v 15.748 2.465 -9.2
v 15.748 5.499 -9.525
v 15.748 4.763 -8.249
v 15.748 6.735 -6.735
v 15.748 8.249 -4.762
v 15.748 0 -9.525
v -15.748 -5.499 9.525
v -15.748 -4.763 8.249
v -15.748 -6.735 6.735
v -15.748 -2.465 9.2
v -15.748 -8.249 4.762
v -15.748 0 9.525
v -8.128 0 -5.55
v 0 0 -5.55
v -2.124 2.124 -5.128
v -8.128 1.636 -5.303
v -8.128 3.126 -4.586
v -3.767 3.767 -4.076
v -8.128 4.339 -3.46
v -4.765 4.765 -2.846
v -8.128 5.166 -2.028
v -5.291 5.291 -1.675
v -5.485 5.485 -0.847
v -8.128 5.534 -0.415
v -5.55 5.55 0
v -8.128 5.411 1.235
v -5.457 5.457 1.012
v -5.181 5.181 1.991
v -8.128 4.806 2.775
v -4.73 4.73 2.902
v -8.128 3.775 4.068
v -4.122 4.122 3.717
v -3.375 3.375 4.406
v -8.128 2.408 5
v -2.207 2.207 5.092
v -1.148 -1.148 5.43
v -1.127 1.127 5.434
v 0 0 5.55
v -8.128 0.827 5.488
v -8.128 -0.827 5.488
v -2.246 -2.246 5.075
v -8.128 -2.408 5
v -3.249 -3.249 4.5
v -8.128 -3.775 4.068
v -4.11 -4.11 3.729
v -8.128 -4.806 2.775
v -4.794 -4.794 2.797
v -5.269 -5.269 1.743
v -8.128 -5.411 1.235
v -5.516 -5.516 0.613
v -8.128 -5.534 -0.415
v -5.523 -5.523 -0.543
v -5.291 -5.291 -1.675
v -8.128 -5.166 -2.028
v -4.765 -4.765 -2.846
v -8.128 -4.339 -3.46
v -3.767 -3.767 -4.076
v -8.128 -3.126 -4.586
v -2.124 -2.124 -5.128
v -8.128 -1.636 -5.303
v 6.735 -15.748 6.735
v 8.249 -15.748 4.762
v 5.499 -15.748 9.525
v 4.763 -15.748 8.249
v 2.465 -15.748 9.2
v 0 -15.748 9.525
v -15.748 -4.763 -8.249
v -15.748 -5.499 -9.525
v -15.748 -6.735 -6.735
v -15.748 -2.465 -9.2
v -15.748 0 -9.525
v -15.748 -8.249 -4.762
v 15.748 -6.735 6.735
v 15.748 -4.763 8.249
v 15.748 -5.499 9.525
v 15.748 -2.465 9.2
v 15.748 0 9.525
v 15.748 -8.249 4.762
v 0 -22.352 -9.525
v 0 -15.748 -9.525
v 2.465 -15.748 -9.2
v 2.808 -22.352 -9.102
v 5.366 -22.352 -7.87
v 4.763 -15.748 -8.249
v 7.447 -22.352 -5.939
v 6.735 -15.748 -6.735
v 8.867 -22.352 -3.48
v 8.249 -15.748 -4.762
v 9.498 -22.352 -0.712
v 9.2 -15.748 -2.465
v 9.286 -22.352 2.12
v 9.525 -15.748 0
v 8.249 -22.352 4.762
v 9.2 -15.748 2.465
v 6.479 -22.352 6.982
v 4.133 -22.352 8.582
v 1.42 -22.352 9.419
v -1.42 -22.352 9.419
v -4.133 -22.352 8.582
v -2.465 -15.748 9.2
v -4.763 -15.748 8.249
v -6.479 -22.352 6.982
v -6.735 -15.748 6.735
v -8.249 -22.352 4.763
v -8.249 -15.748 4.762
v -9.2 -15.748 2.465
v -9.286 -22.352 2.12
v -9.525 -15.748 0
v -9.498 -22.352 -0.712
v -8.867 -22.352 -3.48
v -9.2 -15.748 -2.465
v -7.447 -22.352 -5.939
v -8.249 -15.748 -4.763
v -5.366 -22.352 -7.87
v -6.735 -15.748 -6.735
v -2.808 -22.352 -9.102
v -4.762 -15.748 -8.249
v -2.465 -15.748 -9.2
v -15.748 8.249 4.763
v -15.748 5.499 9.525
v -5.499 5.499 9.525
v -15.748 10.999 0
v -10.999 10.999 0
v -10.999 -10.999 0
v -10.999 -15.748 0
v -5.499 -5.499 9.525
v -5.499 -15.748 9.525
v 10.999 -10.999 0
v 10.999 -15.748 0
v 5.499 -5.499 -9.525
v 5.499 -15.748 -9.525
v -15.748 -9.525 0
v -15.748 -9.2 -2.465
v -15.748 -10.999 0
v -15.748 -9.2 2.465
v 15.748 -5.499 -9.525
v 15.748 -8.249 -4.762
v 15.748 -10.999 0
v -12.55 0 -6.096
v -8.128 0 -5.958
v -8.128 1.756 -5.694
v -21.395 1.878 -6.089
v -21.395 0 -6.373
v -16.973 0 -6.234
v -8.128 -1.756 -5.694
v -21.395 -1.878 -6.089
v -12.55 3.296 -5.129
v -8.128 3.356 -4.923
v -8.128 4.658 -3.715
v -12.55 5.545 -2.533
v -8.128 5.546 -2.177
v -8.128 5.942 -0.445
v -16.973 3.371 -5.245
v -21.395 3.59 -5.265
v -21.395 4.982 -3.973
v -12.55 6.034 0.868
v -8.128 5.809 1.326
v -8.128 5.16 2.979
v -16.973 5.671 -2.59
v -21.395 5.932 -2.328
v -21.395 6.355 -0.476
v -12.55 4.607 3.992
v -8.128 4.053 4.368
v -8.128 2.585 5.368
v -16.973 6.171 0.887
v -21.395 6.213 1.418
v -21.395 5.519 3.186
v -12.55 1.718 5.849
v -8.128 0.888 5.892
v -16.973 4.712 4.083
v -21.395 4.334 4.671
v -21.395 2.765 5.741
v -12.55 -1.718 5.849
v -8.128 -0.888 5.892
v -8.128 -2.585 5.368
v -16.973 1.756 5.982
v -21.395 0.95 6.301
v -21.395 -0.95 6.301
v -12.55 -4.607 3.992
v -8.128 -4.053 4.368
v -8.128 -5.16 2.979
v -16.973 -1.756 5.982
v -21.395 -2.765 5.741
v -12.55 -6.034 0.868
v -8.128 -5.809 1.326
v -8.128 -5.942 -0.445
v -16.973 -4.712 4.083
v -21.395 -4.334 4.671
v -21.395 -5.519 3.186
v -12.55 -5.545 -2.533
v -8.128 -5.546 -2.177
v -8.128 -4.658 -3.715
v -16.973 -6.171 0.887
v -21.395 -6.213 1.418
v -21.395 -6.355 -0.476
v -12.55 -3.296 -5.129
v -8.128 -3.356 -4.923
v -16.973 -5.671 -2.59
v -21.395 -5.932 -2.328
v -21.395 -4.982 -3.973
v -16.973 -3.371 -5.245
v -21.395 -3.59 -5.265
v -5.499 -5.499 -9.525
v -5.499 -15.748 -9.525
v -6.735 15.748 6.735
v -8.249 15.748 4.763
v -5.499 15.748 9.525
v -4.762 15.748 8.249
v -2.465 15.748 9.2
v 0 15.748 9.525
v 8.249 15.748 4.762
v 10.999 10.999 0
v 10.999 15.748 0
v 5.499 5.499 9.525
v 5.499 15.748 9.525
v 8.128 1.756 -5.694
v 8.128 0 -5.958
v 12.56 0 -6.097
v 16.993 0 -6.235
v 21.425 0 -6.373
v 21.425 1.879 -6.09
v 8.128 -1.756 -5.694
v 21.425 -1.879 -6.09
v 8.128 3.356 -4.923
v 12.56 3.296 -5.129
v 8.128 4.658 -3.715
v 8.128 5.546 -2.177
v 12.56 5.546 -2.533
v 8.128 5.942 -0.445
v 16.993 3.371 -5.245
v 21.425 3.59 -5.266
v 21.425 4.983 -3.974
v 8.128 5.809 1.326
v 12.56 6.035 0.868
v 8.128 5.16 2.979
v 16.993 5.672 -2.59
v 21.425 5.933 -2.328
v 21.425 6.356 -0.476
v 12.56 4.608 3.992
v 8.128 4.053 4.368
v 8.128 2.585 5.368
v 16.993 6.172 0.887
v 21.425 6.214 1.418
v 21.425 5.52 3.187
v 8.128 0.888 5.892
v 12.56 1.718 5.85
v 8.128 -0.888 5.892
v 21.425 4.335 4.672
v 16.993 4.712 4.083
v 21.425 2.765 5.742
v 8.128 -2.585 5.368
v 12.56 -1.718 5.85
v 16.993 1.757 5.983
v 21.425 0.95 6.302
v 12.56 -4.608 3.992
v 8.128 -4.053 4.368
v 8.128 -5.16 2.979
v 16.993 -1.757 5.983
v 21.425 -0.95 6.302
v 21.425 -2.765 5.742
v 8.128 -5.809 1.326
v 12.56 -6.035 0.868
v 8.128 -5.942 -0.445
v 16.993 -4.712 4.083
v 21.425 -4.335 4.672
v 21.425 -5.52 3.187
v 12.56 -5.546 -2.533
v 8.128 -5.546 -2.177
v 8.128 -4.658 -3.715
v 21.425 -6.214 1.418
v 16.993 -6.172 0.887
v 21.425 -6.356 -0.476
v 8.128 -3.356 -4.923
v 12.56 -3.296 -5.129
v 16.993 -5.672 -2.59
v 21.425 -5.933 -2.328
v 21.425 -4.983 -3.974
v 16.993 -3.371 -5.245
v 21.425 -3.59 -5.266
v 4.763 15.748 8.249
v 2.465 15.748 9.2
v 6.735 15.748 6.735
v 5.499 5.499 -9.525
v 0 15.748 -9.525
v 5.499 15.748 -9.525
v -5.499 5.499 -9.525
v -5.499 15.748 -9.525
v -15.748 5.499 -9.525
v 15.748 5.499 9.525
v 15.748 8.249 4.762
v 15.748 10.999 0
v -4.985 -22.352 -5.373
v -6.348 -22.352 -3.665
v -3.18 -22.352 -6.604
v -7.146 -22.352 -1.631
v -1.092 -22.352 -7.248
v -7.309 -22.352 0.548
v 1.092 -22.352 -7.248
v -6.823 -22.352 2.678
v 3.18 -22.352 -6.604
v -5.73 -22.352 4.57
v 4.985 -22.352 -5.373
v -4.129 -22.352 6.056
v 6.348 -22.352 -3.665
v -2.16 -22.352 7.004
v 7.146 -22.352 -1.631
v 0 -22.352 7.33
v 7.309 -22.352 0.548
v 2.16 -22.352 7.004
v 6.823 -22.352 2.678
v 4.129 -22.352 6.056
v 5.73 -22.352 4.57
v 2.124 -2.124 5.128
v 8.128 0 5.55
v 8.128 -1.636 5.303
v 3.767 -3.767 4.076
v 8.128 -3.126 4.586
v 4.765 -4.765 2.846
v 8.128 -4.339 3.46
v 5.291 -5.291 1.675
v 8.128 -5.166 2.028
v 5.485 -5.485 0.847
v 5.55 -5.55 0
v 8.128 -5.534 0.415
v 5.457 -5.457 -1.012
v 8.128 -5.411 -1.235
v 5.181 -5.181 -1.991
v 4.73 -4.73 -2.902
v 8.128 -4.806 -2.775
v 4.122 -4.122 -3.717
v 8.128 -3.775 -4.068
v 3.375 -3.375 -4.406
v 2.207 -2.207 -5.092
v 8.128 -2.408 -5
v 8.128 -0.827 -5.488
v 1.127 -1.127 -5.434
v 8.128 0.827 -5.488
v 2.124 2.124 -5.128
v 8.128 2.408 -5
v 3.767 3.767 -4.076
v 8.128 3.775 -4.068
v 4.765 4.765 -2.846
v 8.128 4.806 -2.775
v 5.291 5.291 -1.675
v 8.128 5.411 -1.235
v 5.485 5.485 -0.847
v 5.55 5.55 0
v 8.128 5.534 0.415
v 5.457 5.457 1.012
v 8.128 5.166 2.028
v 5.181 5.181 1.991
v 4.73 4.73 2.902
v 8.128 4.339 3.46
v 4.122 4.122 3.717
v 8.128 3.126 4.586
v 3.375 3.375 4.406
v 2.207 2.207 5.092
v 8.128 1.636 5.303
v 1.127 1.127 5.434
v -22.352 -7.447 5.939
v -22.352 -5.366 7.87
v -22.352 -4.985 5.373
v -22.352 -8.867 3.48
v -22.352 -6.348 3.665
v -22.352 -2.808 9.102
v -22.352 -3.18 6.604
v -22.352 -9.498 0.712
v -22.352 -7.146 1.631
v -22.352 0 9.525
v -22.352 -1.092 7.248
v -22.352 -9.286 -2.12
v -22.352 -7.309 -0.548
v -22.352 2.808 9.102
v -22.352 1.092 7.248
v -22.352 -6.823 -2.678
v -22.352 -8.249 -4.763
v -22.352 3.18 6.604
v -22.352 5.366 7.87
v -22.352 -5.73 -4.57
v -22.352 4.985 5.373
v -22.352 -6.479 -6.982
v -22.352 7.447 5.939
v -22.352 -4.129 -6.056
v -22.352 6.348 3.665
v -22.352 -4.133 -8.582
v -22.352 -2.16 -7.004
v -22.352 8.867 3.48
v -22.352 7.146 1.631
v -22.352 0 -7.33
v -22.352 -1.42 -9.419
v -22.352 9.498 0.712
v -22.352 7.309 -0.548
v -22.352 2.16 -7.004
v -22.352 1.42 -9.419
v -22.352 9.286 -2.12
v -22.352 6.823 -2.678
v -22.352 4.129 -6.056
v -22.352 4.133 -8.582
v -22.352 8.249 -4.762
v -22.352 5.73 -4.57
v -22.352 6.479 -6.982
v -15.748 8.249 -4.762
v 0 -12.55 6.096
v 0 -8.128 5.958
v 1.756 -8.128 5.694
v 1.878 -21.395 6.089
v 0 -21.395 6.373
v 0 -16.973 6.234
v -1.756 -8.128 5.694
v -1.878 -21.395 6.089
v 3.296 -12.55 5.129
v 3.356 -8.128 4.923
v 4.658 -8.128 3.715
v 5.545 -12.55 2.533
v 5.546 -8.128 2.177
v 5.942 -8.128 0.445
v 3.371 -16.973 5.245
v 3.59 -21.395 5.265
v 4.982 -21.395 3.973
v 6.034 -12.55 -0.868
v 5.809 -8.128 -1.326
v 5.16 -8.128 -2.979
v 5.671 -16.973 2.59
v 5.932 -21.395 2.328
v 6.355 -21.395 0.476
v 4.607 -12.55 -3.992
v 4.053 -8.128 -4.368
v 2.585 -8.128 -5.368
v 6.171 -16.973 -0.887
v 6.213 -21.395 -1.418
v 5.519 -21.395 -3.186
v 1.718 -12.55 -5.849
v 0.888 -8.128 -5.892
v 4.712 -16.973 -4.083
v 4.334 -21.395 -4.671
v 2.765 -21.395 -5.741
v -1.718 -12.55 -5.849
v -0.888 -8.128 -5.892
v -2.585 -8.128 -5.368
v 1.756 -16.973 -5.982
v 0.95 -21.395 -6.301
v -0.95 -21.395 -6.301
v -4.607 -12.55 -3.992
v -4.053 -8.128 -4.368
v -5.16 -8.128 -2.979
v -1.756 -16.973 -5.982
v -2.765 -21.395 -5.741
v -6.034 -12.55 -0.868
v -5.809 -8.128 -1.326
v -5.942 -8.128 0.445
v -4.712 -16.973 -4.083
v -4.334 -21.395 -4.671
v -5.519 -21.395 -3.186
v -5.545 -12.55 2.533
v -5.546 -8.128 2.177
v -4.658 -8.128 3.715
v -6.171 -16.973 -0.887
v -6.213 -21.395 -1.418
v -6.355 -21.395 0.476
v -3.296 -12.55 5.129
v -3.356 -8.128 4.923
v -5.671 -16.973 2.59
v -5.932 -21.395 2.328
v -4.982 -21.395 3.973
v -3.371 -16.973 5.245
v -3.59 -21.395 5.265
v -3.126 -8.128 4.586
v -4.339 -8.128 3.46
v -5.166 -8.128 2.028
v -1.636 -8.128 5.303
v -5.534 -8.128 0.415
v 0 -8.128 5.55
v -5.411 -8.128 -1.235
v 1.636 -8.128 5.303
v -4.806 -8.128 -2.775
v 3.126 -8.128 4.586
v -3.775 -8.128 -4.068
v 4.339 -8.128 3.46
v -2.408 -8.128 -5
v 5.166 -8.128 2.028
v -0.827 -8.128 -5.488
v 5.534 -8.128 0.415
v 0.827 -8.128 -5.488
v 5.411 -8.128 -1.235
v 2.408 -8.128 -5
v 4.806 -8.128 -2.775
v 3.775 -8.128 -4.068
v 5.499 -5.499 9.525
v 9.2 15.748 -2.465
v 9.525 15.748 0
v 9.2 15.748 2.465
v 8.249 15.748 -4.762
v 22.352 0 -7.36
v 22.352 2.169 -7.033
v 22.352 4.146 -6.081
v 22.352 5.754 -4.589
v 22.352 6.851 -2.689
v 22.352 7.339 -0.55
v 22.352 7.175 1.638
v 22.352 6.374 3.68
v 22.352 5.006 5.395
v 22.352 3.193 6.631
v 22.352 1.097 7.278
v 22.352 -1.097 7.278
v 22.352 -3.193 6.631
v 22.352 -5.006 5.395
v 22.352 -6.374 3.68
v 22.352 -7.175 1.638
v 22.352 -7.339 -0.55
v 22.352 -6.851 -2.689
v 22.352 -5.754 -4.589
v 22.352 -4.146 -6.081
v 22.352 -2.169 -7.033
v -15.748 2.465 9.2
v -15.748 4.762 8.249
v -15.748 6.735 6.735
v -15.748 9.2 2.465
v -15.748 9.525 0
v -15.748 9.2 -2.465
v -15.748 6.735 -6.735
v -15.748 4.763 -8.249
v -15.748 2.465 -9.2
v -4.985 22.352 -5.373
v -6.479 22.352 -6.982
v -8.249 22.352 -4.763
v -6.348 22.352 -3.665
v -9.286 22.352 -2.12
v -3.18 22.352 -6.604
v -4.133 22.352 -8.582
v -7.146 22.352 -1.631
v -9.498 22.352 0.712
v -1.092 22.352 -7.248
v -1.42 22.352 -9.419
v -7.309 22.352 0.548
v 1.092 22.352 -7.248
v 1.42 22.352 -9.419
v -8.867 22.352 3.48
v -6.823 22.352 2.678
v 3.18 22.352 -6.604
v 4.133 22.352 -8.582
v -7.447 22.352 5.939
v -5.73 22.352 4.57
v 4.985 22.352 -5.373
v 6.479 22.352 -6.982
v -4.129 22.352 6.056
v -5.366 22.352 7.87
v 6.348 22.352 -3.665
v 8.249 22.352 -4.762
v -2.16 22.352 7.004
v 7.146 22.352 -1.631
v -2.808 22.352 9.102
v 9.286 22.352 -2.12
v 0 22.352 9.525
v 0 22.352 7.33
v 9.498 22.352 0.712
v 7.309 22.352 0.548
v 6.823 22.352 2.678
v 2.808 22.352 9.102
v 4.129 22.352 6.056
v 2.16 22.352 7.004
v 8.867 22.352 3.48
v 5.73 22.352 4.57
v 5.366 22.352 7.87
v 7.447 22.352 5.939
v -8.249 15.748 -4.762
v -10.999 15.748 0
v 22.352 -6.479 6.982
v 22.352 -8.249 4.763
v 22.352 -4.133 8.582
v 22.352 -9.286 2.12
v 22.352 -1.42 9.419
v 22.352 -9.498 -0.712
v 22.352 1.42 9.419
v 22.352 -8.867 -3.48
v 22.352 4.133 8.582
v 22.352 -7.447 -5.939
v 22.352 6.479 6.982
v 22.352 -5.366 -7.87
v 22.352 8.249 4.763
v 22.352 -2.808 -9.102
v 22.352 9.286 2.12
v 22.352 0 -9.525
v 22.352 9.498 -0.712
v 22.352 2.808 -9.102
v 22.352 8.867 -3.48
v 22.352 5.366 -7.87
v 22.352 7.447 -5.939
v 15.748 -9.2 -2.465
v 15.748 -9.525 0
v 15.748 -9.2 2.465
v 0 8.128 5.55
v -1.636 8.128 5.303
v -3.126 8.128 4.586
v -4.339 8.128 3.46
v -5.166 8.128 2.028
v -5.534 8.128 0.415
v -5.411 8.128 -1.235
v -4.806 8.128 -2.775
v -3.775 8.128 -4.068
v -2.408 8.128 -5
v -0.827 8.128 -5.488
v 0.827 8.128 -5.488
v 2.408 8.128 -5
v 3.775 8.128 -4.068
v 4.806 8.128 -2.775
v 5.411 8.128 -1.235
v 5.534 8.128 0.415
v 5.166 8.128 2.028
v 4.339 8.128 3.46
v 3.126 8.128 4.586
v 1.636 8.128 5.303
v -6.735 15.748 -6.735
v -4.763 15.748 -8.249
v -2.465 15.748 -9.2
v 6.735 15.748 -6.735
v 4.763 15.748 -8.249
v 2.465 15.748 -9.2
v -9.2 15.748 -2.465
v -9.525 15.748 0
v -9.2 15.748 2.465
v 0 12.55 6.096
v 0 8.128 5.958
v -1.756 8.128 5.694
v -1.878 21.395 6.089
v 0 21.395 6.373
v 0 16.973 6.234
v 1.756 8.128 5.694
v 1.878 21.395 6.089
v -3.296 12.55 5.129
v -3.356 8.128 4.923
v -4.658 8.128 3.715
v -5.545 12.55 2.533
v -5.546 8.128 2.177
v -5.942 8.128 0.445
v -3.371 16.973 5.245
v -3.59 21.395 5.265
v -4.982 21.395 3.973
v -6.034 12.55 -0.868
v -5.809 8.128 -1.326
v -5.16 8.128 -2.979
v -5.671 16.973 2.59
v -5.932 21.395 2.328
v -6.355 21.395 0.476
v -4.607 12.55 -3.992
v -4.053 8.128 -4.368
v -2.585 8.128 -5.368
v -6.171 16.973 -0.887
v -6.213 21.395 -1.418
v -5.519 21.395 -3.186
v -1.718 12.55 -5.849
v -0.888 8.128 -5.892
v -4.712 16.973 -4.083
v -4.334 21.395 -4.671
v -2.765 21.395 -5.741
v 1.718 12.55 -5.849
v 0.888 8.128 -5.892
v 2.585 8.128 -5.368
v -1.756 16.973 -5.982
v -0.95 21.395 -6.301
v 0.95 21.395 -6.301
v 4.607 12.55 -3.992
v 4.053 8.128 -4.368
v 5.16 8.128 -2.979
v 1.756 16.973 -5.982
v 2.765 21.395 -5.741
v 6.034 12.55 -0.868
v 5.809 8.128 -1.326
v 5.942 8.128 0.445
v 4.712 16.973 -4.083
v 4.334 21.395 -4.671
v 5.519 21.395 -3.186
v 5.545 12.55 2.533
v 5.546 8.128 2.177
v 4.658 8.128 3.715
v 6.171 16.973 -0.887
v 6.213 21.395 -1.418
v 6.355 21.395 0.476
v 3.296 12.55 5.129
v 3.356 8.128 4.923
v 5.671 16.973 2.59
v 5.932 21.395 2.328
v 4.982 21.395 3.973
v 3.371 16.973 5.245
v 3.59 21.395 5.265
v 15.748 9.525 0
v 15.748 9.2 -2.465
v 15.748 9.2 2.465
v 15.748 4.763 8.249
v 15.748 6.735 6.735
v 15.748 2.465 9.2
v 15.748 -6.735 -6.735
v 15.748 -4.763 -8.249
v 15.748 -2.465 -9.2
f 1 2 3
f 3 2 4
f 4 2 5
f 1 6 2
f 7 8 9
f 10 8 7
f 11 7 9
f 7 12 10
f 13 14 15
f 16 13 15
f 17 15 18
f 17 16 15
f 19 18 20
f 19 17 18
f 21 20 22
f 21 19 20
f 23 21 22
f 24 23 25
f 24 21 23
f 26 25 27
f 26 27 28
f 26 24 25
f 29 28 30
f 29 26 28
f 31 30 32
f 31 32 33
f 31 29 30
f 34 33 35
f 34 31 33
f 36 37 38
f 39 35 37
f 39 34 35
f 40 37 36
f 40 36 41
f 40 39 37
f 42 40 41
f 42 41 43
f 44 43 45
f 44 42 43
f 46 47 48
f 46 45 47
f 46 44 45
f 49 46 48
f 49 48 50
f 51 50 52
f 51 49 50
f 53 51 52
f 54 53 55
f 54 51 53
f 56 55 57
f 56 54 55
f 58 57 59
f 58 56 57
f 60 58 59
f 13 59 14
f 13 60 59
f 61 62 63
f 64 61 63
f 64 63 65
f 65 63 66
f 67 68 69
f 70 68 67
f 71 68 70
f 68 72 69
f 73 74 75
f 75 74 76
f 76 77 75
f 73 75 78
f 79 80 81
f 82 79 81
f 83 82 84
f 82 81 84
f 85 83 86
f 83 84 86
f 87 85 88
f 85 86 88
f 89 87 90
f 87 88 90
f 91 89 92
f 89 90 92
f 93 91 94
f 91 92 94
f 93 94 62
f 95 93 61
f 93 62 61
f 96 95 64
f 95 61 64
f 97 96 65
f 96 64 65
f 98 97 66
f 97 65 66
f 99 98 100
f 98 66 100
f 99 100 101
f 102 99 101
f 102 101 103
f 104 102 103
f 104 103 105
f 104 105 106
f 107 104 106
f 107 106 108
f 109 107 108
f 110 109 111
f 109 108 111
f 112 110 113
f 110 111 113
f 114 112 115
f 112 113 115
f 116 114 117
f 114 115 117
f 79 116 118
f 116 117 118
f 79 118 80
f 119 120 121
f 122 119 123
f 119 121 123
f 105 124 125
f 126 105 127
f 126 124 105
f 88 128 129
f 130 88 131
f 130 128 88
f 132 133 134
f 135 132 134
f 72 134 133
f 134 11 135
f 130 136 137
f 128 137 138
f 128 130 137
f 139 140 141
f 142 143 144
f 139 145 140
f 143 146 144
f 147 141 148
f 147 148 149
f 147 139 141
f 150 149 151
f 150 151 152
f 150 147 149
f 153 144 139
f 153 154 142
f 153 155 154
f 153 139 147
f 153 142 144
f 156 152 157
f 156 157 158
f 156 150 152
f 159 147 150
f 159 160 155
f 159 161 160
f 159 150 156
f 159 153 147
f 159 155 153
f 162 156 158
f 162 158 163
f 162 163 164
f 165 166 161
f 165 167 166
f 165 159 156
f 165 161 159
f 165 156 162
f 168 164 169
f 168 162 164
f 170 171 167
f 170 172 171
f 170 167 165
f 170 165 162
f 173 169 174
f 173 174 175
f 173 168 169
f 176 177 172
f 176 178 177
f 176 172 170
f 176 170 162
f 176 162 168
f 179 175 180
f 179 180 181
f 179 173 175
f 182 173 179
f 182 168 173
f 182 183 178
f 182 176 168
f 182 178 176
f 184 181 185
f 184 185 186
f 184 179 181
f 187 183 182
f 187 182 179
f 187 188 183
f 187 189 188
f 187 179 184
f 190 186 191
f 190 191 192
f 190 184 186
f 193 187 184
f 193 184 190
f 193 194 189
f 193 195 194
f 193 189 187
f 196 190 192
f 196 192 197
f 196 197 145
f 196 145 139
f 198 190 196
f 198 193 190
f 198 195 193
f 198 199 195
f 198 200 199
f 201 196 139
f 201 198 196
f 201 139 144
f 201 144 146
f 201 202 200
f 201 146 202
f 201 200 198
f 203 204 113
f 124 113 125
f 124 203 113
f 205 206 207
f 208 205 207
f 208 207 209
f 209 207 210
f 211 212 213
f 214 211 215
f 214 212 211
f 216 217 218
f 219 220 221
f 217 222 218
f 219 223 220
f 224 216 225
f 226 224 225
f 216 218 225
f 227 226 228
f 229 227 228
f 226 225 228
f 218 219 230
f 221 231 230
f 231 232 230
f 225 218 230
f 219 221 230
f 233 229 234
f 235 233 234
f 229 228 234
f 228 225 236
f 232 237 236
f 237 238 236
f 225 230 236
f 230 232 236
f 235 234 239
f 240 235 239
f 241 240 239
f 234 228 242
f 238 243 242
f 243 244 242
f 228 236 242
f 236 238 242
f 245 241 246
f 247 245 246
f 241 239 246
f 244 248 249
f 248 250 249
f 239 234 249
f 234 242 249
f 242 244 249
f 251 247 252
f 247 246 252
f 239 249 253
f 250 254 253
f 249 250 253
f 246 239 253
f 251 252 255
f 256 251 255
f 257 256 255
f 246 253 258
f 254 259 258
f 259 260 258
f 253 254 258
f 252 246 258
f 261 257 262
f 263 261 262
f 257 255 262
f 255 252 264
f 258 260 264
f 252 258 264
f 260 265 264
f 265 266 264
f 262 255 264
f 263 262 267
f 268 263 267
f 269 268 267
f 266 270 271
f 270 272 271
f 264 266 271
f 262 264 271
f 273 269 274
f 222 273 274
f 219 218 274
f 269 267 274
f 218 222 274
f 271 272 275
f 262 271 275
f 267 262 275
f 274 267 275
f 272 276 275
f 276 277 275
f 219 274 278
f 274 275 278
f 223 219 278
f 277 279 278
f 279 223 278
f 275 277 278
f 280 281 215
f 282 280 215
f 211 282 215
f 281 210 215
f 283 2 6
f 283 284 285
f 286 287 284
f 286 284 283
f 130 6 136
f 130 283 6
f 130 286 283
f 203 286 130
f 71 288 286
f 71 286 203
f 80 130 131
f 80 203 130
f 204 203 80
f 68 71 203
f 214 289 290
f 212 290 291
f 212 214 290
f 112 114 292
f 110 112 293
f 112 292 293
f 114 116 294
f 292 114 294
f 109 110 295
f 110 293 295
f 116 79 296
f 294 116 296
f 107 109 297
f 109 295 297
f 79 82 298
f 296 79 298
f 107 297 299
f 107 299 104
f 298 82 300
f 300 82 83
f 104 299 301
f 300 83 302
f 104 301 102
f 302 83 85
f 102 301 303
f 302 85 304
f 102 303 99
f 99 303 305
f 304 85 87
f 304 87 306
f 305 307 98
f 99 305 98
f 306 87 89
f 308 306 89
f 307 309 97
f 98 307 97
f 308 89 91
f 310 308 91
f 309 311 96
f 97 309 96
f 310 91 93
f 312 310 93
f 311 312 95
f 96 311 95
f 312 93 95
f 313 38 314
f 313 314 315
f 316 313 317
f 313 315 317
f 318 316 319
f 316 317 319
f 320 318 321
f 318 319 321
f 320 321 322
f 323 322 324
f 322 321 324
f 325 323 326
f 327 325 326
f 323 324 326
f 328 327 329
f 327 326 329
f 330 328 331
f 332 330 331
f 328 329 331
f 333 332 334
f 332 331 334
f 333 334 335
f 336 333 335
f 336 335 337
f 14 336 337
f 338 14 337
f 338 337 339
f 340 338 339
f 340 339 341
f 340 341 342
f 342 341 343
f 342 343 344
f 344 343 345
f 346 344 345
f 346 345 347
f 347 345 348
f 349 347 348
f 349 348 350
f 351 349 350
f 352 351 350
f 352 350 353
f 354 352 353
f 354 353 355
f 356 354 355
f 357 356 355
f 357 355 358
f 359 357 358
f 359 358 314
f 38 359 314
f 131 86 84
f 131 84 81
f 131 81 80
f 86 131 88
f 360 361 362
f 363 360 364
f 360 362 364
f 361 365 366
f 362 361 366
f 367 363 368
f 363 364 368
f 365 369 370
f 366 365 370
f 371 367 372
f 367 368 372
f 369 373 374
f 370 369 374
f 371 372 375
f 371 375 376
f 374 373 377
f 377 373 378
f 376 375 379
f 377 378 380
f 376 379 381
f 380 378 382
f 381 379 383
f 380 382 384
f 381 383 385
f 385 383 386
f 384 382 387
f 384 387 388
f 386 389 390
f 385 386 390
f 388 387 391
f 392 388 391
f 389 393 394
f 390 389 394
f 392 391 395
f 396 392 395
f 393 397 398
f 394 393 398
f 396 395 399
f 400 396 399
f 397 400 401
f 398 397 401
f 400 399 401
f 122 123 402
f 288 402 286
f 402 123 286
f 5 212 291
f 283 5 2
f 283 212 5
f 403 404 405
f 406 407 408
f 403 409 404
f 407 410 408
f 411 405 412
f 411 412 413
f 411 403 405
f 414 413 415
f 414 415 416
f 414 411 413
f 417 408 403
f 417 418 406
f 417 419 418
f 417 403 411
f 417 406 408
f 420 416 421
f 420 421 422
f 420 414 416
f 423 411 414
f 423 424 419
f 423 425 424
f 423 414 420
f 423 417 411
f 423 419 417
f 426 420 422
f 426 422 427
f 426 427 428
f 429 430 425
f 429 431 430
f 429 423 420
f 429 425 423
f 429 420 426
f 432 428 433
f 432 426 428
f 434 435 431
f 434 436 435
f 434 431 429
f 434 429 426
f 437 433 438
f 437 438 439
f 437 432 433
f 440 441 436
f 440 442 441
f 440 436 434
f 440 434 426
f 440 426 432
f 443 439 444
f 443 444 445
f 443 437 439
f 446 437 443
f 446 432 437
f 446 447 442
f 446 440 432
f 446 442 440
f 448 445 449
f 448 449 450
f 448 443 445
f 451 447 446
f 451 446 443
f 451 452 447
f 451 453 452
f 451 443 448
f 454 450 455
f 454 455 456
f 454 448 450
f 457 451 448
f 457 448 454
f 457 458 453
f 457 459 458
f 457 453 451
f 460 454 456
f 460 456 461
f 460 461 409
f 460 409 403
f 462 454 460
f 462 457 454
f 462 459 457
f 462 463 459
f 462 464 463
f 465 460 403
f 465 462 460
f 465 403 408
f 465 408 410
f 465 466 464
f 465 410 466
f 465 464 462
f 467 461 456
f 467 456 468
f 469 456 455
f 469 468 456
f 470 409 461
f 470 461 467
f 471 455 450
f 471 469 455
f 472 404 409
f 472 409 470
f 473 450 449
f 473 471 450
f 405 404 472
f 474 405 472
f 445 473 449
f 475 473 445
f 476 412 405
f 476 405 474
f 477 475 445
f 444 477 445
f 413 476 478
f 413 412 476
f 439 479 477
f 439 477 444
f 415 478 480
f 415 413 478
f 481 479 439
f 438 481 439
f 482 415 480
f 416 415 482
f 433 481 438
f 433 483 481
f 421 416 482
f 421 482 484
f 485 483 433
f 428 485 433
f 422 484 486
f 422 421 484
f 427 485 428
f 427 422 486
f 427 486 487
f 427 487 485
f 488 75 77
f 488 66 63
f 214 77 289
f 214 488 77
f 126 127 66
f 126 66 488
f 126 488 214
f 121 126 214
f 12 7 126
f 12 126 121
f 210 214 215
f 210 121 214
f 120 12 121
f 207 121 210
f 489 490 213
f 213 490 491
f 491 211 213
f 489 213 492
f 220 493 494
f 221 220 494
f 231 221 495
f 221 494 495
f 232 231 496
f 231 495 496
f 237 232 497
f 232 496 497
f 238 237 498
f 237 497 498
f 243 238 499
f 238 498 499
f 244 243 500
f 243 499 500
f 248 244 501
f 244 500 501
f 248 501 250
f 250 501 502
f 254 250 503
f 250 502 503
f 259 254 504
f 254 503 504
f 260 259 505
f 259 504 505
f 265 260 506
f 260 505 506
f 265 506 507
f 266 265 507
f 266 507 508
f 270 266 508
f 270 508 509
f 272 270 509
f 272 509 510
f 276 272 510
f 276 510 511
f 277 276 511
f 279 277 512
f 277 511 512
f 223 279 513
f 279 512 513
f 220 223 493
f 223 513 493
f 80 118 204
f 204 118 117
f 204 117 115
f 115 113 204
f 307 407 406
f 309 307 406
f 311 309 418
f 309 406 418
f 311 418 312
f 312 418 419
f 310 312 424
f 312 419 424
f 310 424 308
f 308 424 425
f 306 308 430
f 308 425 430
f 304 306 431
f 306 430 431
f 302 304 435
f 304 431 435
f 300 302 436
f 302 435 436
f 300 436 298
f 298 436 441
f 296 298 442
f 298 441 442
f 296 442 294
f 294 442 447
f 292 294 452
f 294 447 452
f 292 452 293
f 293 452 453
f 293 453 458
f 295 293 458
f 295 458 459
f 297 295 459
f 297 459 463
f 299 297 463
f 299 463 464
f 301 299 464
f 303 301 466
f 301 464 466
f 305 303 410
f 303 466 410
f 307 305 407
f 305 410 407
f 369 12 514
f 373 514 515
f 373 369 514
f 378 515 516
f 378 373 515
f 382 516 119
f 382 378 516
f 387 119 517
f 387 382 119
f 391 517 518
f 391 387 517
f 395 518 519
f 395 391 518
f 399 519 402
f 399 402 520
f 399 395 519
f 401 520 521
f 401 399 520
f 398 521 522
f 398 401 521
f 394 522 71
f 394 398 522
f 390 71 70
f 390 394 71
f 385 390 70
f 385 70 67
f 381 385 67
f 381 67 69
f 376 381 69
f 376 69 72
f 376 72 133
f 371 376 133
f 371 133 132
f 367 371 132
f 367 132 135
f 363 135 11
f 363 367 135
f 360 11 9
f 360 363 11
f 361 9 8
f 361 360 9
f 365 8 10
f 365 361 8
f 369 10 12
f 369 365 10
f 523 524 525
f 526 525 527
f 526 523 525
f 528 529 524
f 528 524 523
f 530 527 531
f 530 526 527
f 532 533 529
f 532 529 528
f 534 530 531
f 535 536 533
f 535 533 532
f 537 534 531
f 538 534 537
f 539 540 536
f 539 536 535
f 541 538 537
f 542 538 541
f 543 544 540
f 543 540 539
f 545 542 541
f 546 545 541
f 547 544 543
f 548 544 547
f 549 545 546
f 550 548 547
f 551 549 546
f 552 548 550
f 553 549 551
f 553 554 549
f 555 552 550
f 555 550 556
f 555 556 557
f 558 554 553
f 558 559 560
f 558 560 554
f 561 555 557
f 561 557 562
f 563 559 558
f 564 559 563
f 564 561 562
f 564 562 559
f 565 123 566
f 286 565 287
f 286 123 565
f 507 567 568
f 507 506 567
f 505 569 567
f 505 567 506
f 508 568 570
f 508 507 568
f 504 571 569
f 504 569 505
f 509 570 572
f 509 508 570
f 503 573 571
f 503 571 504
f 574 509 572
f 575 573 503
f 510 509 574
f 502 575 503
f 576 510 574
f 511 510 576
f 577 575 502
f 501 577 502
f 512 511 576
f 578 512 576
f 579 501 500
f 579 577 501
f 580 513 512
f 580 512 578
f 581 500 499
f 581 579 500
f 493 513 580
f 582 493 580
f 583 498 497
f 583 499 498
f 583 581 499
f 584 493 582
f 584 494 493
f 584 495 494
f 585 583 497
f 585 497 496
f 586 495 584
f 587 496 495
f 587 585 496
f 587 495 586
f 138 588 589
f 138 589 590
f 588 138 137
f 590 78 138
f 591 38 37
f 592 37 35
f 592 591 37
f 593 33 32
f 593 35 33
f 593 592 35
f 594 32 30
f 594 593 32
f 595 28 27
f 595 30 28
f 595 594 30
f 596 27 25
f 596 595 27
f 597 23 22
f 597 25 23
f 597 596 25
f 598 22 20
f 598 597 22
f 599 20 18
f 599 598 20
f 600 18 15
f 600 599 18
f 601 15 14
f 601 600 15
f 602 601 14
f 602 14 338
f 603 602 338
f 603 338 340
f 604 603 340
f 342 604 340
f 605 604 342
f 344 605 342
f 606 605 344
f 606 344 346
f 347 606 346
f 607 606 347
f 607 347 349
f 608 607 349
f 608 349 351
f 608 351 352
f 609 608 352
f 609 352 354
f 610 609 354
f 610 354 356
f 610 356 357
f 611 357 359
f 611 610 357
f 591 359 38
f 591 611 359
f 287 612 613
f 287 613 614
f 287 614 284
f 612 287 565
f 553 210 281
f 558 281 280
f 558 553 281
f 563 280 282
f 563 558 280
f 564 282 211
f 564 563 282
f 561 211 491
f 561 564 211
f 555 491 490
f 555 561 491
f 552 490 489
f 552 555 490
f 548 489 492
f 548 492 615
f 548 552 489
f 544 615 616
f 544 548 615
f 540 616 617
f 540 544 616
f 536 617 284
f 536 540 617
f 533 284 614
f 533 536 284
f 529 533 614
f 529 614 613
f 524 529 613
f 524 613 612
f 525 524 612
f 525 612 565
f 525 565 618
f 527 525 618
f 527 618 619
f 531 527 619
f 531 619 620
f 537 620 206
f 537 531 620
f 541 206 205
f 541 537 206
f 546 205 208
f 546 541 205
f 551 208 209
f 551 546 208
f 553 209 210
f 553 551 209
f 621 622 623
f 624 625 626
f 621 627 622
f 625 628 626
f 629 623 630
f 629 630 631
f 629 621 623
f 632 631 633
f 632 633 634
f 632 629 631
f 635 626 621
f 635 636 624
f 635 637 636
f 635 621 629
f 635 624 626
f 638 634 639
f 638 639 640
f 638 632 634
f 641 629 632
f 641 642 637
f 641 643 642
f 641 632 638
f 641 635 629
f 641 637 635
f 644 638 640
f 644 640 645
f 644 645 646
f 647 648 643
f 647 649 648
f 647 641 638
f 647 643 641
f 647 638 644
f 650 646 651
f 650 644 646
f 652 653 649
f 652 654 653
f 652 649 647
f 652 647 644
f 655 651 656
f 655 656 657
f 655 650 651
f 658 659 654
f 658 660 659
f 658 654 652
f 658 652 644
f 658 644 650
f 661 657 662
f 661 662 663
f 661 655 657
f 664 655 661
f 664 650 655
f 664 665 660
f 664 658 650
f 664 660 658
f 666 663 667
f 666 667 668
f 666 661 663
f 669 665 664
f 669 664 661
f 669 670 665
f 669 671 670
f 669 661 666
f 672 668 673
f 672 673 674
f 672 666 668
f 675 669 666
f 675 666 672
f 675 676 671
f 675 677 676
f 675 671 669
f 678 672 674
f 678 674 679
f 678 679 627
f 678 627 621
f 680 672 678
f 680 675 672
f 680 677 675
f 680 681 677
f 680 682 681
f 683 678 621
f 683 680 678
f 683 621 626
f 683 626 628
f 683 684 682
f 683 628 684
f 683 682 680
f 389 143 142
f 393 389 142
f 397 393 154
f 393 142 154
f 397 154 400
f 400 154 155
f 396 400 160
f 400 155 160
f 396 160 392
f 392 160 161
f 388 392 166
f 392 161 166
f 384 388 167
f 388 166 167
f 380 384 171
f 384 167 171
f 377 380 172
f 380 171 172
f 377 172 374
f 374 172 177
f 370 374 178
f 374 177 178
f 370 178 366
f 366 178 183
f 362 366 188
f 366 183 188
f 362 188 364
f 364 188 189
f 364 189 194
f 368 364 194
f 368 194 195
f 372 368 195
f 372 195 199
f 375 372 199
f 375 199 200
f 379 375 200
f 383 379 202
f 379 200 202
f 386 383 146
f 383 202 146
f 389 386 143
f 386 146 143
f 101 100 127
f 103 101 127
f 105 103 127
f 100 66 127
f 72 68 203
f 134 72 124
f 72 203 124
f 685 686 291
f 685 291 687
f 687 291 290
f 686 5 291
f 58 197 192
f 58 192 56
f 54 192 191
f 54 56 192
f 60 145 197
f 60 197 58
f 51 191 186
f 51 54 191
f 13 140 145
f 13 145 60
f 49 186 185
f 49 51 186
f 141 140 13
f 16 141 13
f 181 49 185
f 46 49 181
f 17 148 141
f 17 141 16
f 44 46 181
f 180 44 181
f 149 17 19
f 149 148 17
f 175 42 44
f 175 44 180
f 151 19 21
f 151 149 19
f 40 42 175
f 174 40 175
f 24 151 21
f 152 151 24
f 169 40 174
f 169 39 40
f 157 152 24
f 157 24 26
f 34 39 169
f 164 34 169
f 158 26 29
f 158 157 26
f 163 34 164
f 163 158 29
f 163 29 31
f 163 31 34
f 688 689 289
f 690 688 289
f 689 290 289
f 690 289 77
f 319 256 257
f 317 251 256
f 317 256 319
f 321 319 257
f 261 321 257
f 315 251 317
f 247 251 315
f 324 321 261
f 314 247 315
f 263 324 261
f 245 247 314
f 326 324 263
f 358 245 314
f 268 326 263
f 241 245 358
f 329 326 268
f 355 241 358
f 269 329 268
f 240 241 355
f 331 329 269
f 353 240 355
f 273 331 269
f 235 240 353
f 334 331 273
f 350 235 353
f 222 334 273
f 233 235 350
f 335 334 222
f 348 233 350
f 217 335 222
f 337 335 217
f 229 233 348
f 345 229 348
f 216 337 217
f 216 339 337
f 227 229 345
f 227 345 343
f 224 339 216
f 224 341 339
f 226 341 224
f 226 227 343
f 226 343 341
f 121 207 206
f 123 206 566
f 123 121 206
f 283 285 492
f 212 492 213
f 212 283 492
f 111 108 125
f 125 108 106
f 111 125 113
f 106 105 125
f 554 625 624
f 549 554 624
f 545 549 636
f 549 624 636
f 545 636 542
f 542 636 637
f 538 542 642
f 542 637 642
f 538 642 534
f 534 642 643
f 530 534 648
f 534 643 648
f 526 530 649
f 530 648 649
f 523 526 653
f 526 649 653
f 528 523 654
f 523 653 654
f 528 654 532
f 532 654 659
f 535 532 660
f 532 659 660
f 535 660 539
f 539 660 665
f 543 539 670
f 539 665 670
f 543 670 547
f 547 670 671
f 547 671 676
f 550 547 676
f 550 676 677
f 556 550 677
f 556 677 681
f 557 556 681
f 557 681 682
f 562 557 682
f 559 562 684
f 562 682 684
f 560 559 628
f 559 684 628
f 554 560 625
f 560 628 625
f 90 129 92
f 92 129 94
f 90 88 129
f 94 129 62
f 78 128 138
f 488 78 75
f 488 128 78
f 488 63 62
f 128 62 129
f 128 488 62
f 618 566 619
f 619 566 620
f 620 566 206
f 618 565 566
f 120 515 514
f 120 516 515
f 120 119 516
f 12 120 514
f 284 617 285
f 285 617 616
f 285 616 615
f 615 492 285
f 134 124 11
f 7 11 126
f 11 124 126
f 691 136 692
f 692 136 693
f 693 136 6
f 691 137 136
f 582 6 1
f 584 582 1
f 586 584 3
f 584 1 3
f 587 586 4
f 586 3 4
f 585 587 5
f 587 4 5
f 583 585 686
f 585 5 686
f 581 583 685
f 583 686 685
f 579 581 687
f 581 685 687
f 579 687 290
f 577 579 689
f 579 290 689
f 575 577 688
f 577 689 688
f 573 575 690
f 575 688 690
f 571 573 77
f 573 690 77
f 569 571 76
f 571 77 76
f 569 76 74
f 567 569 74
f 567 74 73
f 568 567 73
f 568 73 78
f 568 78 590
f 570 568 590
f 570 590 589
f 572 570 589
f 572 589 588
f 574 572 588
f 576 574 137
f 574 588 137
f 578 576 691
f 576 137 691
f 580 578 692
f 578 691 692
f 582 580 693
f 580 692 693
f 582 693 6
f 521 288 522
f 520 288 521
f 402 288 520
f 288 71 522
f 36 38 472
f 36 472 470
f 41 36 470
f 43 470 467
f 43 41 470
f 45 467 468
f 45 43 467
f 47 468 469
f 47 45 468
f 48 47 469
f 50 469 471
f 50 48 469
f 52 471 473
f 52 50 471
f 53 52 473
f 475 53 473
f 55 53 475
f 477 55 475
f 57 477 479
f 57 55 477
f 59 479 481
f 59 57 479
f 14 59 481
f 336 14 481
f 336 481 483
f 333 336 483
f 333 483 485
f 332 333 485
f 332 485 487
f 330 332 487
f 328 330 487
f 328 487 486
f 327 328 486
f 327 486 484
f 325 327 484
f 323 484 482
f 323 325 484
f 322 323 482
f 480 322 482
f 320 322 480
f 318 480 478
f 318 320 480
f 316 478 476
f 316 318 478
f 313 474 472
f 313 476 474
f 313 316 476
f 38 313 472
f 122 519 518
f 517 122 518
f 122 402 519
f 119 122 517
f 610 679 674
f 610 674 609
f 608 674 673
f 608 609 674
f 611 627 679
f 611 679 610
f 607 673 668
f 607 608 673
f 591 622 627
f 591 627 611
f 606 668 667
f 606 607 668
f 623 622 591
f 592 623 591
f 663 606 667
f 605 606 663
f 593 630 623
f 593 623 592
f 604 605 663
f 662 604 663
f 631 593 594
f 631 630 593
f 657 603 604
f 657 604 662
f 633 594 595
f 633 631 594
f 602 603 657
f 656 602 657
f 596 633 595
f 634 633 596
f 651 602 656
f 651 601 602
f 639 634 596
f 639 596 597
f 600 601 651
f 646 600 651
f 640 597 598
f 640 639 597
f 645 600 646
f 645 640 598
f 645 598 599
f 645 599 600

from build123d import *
from OCP.BRepFilletAPI import BRepFilletAPI_MakeChamfer

# Parameters (mm, degrees)
BOSS_EXTRUDE1_START     = -21.997045256
BOSS_EXTRUDE1_DEPTH     = 26.746522628
BOSS_EXTRUDE1_START_2   = -16.497783942
BOSS_EXTRUDE1_2_DEPTH   = 10.998522628
BOSS_EXTRUDE1_START_3   = -10.998522628
BOSS_EXTRUDE1_3_DEPTH   = 21.997045256
BOSS_EXTRUDE2_DEPTH     = 4.749477372
BOSS_EXTRUDE3_DEPTH     = 4.749477372
BOSS_EXTRUDE4_DEPTH     = 4.749477372
SKETCH5_R               = 9.525
BOSS_EXTRUDE5_DEPTH     = 6.604
SKETCH10_R              = 6.402403746
CUT_EXTRUDE2_DEPTH      = 14.224
CUT_EXTRUDE2_DRAFT      = -1.788167188
CUT_EXTRUDE3_REACH      = 32.146
CUT_EXTRUDE3_END_RADIUS = 5.5499
SKETCH11_R              = 5.5499
SKETCH12_W              = 6.604
SKETCH12_H              = 9.525
SKETCH13_W              = 9.525
SKETCH13_H              = 6.604
SKETCH14_W              = 9.525
SKETCH14_H              = 6.604
CHAMFER1_SIZE           = 0.9271
CHAMFER1_SIZE2          = 0.957442613


with BuildPart() as part:
    # Boss-Extrude1: read off the stored shape, not the designer's step
    # Boss-Extrude1 outline → Boss-Extrude1 (new body)
    with BuildSketch(Plane.ZY.offset(10.998522628).offset(BOSS_EXTRUDE1_START)):
        Polygon((-9.525, 5.499261314), (-9.525, -5.499261314), (0, -10.998522628), (9.525, -5.499261314), (9.525, 5.499261314), (0, 10.998522628), align=None)
    extrude(amount=BOSS_EXTRUDE1_DEPTH)

    # Boss-Extrude1 2 outline → Boss-Extrude1 2 (add)
    with BuildSketch(Plane.ZY.offset(10.998522628).offset(BOSS_EXTRUDE1_START_2)):
        Polygon((-9.525, -5.499261314), (-9.525, -10.998522628), (0, -10.998522628), align=None)
        Polygon((9.525, -5.499261314), (0, -10.998522628), (9.525, -10.998522628), align=None)
        Polygon((-9.525, 10.998522628), (-9.525, 5.499261314), (0, 10.998522628), align=None)
        Polygon((9.525, 10.998522628), (0, 10.998522628), (9.525, 5.499261314), align=None)
    extrude(amount=BOSS_EXTRUDE1_2_DEPTH)

    # Boss-Extrude1 3 outline → Boss-Extrude1 3 (add)
    with BuildSketch(Plane(origin=(0, 0, 0), x_dir=(1, 0, 0), z_dir=(0, 1, 0)).offset(BOSS_EXTRUDE1_START_3)):
        Polygon((10.998522628, 0), (5.499261314, 9.525), (5.499261314, -9.525), align=None)
        Polygon((-10.998522628, 0), (-5.499261314, -9.525), (-5.499261314, 9.525), align=None)
    extrude(amount=BOSS_EXTRUDE1_3_DEPTH)

    # Sketch2 → Boss-Extrude2 (add)
    with BuildSketch(Plane.XZ.offset(10.998522628)):
        Polygon((-5.499261314, -9.525), (-10.998522628, 0), (-5.499261314, 9.525), (5.499261314, 9.525), (10.998522628, 0), (5.499261314, -9.525), align=None)
    extrude(amount=BOSS_EXTRUDE2_DEPTH)

    # Sketch3 → Boss-Extrude3 (add)
    with BuildSketch(Plane(origin=(0, 10.998522628, 0), x_dir=(-1, 0, 0), z_dir=(0, 1, 0))):
        Polygon((-5.499261314, 9.525), (5.499261314, 9.525), (10.998522628, 0), (5.499261314, -9.525), (-5.499261314, -9.525), (-10.998522628, 0), align=None)
    extrude(amount=BOSS_EXTRUDE3_DEPTH)

    # Sketch4 → Boss-Extrude4 (add)
    with BuildSketch(Plane(origin=(10.998522628, 0, 0), x_dir=(0, 0, -1), z_dir=(1, 0, 0))):
        Polygon((0, 10.998522628), (9.525, 5.499261314), (9.525, -5.499261314), (0, -10.998522628), (-9.525, -5.499261314), (-9.525, 5.499261314), align=None)
    extrude(amount=BOSS_EXTRUDE4_DEPTH)

    # Sketch5 → Boss-Extrude5 (add)
    with BuildSketch(Plane(origin=(15.748, 0, 0), x_dir=(0, 0, -1), z_dir=(1, 0, 0))):
        Circle(SKETCH5_R)
    extrude(amount=BOSS_EXTRUDE5_DEPTH)


with BuildPart() as cut_extrude2_tool:
    # Sketch10 → Cut-Extrude2 (with draft: the straight prism first)
    with BuildSketch(Plane(origin=(22.352, 0, 0), x_dir=(0, 0, -1), z_dir=(1, 0, 0))):
        Circle(SKETCH10_R)
    extrude(amount=-CUT_EXTRUDE2_DEPTH)
    # Cut-Extrude2: the draft: its side faces are tilted about the plane it starts from
    cut_extrude2_sides = [cut_extrude2_tool.faces().sort_by_distance(p)[0] for p in [
        (15.24, 0, 6.402403746),
    ]]
    draft(cut_extrude2_sides, Plane(origin=(22.352, 0, 0), x_dir=(0, 0, -1), z_dir=(1, 0, 0)), CUT_EXTRUDE2_DRAFT)


with BuildPart() as part_1:
    add(part.part)

    # Cut-Extrude2: cut by cut_extrude2_tool
    add(cut_extrude2_tool.part, mode=Mode.SUBTRACT)

    # Cut-Extrude3: up to this cylinder (the profile starts outside it)
    cut_extrude3_end = Plane(origin=(0, 0, 0), z_dir=(0, 1, 0)) * Cylinder(CUT_EXTRUDE3_END_RADIUS, 76.3918, mode=Mode.PRIVATE)
    # Sketch11 → Cut-Extrude3 (cut, up to the surface)
    with BuildSketch(Plane(origin=(8.128, 0, 0), x_dir=(0, 0, -1), z_dir=(1, 0, 0)), mode=Mode.PRIVATE) as cut_extrude3_sk1:
        with Locations(Location((0, 0, 0), (0, 0, 180))):
            Circle(SKETCH11_R)
    cut_extrude3_tool1 = extrude(cut_extrude3_sk1.sketch, amount=-CUT_EXTRUDE3_REACH, mode=Mode.PRIVATE) - cut_extrude3_end
    add(cut_extrude3_tool1.solids().sort_by_distance((8.128, 0, 0))[0], mode=Mode.SUBTRACT)

    # Sketch12 → Revolve1 (revolve)
    with BuildSketch(Plane(origin=(0, 0, 0), x_dir=(-1, 0, 0), z_dir=(0, 0, -1)), mode=Mode.PRIVATE) as revolve1_sk:
        with Locations((19.05, 4.7625)):
            Rectangle(SKETCH12_W, SKETCH12_H)
    revolve(revolve1_sk.sketch.rotate(Axis((-15.748, 0, 0), (-1, 0, 0)), 270), axis=Axis((-15.748, 0, 0), (-1, 0, 0)))

    # Sketch13 → Revolve2 (revolve)
    with BuildSketch(Plane.XY, mode=Mode.PRIVATE) as revolve2_sk:
        with Locations((4.7625, -19.05)):
            Rectangle(SKETCH13_W, SKETCH13_H)
    revolve(revolve2_sk.sketch.rotate(Axis((0, -15.748, 0), (0, -1, 0)), 270), axis=Axis((0, -15.748, 0), (0, -1, 0)))

    # Sketch14 → Revolve3 (revolve)
    with BuildSketch(Plane(origin=(0, 0, 0), x_dir=(-1, 0, 0), z_dir=(0, 0, -1)), mode=Mode.PRIVATE) as revolve3_sk:
        with Locations((-4.7625, 19.05)):
            Rectangle(SKETCH14_W, SKETCH14_H)
    revolve(revolve3_sk.sketch.rotate(Axis((0, 15.748, 0), (0, 1, 0)), 270), axis=Axis((0, 15.748, 0), (0, 1, 0)))

    # Sketch15 → Cut-Revolve1 (revolve, cut)
    with BuildSketch(Plane(origin=(0, 0, 0), x_dir=(-1, 0, 0), z_dir=(0, 0, -1)), mode=Mode.PRIVATE) as cut_revolve1_sk:
        Polygon((-6.402403746, -22.352), (0, -22.352), (0, 0), (-5.5499, 0), (-5.5499, -8.128), (-5.958336981, -8.128), align=None)
    revolve(cut_revolve1_sk.sketch.rotate(Axis((0, -22.352, 0), (0, 1, 0)), 270), axis=Axis((0, -22.352, 0), (0, 1, 0)), mode=Mode.SUBTRACT)

    # Sketch16 → Cut-Revolve2 (revolve, cut)
    with BuildSketch(Plane.XY, mode=Mode.PRIVATE) as cut_revolve2_sk:
        Polygon((6.402403746, 22.352), (0, 22.352), (0, 0), (5.5499, 0), (5.5499, 8.128), (5.958336981, 8.128), align=None)
    revolve(cut_revolve2_sk.sketch.rotate(Axis((0, 22.352, 0), (0, -1, 0)), 90), axis=Axis((0, 22.352, 0), (0, -1, 0)), mode=Mode.SUBTRACT)

    # Sketch17 → Cut-Revolve3 (revolve, cut)
    with BuildSketch(Plane.XY, mode=Mode.PRIVATE) as cut_revolve3_sk:
        Polygon((-22.352, 6.402403746), (-22.352, 0), (0, 0), (0, 5.5499), (-8.128, 5.5499), (-8.128, 5.958336981), align=None)
    revolve(cut_revolve3_sk.sketch.rotate(Axis((-22.352, 0, 0), (1, 0, 0)), 270), axis=Axis((-22.352, 0, 0), (1, 0, 0)), mode=Mode.SUBTRACT)

    # Chamfer1: one chamfer whose edges measure the first distance from different faces: ONE call of the kernel's chamfer builder (chamfer() names one face for all edges)
    chamfer1_edges_1 = [part_1.edges().sort_by_distance(p)[0] for p in [
        (22.352, 0, 6.402403746),
    ]]
    chamfer1_side_1 = [part_1.faces().sort_by_distance(p)[0] for p in [
        (15.24, 0, 6.180370364),
    ]]
    chamfer1_edges_2 = [part_1.edges().sort_by_distance(p)[0] for p in [
        (0, -22.352, -6.402403746),
    ]]
    chamfer1_side_2 = [part_1.faces().sort_by_distance(p)[0] for p in [
        (0, -22.352, 9.255592316),
    ]]
    chamfer1_edges_3 = [part_1.edges().sort_by_distance(p)[0] for p in [
        (0, 22.352, -6.402403746),
    ]]
    chamfer1_side_3 = [part_1.faces().sort_by_distance(p)[0] for p in [
        (0, 22.352, -9.255592316),
    ]]
    chamfer1_edges_4 = [part_1.edges().sort_by_distance(p)[0] for p in [
        (-22.352, 0, 6.402403746),
    ]]
    chamfer1_side_4 = [part_1.faces().sort_by_distance(p)[0] for p in [
        (-22.352, 0, -9.255592316),
    ]]
    chamfer1 = BRepFilletAPI_MakeChamfer(part_1.part.solid().wrapped)
    for e in chamfer1_edges_1:
        chamfer1.Add(CHAMFER1_SIZE, CHAMFER1_SIZE2, e.wrapped, chamfer1_side_1[0].wrapped)  # the first distance lies on this face
    for e in chamfer1_edges_2:
        chamfer1.Add(CHAMFER1_SIZE, CHAMFER1_SIZE2, e.wrapped, chamfer1_side_2[0].wrapped)  # the first distance lies on this face
    for e in chamfer1_edges_3:
        chamfer1.Add(CHAMFER1_SIZE, CHAMFER1_SIZE2, e.wrapped, chamfer1_side_3[0].wrapped)  # the first distance lies on this face
    for e in chamfer1_edges_4:
        chamfer1.Add(CHAMFER1_SIZE, CHAMFER1_SIZE2, e.wrapped, chamfer1_side_4[0].wrapped)  # the first distance lies on this face
    add(Compound.cast(chamfer1.Shape()), mode=Mode.REPLACE)


solid = part_1.part
